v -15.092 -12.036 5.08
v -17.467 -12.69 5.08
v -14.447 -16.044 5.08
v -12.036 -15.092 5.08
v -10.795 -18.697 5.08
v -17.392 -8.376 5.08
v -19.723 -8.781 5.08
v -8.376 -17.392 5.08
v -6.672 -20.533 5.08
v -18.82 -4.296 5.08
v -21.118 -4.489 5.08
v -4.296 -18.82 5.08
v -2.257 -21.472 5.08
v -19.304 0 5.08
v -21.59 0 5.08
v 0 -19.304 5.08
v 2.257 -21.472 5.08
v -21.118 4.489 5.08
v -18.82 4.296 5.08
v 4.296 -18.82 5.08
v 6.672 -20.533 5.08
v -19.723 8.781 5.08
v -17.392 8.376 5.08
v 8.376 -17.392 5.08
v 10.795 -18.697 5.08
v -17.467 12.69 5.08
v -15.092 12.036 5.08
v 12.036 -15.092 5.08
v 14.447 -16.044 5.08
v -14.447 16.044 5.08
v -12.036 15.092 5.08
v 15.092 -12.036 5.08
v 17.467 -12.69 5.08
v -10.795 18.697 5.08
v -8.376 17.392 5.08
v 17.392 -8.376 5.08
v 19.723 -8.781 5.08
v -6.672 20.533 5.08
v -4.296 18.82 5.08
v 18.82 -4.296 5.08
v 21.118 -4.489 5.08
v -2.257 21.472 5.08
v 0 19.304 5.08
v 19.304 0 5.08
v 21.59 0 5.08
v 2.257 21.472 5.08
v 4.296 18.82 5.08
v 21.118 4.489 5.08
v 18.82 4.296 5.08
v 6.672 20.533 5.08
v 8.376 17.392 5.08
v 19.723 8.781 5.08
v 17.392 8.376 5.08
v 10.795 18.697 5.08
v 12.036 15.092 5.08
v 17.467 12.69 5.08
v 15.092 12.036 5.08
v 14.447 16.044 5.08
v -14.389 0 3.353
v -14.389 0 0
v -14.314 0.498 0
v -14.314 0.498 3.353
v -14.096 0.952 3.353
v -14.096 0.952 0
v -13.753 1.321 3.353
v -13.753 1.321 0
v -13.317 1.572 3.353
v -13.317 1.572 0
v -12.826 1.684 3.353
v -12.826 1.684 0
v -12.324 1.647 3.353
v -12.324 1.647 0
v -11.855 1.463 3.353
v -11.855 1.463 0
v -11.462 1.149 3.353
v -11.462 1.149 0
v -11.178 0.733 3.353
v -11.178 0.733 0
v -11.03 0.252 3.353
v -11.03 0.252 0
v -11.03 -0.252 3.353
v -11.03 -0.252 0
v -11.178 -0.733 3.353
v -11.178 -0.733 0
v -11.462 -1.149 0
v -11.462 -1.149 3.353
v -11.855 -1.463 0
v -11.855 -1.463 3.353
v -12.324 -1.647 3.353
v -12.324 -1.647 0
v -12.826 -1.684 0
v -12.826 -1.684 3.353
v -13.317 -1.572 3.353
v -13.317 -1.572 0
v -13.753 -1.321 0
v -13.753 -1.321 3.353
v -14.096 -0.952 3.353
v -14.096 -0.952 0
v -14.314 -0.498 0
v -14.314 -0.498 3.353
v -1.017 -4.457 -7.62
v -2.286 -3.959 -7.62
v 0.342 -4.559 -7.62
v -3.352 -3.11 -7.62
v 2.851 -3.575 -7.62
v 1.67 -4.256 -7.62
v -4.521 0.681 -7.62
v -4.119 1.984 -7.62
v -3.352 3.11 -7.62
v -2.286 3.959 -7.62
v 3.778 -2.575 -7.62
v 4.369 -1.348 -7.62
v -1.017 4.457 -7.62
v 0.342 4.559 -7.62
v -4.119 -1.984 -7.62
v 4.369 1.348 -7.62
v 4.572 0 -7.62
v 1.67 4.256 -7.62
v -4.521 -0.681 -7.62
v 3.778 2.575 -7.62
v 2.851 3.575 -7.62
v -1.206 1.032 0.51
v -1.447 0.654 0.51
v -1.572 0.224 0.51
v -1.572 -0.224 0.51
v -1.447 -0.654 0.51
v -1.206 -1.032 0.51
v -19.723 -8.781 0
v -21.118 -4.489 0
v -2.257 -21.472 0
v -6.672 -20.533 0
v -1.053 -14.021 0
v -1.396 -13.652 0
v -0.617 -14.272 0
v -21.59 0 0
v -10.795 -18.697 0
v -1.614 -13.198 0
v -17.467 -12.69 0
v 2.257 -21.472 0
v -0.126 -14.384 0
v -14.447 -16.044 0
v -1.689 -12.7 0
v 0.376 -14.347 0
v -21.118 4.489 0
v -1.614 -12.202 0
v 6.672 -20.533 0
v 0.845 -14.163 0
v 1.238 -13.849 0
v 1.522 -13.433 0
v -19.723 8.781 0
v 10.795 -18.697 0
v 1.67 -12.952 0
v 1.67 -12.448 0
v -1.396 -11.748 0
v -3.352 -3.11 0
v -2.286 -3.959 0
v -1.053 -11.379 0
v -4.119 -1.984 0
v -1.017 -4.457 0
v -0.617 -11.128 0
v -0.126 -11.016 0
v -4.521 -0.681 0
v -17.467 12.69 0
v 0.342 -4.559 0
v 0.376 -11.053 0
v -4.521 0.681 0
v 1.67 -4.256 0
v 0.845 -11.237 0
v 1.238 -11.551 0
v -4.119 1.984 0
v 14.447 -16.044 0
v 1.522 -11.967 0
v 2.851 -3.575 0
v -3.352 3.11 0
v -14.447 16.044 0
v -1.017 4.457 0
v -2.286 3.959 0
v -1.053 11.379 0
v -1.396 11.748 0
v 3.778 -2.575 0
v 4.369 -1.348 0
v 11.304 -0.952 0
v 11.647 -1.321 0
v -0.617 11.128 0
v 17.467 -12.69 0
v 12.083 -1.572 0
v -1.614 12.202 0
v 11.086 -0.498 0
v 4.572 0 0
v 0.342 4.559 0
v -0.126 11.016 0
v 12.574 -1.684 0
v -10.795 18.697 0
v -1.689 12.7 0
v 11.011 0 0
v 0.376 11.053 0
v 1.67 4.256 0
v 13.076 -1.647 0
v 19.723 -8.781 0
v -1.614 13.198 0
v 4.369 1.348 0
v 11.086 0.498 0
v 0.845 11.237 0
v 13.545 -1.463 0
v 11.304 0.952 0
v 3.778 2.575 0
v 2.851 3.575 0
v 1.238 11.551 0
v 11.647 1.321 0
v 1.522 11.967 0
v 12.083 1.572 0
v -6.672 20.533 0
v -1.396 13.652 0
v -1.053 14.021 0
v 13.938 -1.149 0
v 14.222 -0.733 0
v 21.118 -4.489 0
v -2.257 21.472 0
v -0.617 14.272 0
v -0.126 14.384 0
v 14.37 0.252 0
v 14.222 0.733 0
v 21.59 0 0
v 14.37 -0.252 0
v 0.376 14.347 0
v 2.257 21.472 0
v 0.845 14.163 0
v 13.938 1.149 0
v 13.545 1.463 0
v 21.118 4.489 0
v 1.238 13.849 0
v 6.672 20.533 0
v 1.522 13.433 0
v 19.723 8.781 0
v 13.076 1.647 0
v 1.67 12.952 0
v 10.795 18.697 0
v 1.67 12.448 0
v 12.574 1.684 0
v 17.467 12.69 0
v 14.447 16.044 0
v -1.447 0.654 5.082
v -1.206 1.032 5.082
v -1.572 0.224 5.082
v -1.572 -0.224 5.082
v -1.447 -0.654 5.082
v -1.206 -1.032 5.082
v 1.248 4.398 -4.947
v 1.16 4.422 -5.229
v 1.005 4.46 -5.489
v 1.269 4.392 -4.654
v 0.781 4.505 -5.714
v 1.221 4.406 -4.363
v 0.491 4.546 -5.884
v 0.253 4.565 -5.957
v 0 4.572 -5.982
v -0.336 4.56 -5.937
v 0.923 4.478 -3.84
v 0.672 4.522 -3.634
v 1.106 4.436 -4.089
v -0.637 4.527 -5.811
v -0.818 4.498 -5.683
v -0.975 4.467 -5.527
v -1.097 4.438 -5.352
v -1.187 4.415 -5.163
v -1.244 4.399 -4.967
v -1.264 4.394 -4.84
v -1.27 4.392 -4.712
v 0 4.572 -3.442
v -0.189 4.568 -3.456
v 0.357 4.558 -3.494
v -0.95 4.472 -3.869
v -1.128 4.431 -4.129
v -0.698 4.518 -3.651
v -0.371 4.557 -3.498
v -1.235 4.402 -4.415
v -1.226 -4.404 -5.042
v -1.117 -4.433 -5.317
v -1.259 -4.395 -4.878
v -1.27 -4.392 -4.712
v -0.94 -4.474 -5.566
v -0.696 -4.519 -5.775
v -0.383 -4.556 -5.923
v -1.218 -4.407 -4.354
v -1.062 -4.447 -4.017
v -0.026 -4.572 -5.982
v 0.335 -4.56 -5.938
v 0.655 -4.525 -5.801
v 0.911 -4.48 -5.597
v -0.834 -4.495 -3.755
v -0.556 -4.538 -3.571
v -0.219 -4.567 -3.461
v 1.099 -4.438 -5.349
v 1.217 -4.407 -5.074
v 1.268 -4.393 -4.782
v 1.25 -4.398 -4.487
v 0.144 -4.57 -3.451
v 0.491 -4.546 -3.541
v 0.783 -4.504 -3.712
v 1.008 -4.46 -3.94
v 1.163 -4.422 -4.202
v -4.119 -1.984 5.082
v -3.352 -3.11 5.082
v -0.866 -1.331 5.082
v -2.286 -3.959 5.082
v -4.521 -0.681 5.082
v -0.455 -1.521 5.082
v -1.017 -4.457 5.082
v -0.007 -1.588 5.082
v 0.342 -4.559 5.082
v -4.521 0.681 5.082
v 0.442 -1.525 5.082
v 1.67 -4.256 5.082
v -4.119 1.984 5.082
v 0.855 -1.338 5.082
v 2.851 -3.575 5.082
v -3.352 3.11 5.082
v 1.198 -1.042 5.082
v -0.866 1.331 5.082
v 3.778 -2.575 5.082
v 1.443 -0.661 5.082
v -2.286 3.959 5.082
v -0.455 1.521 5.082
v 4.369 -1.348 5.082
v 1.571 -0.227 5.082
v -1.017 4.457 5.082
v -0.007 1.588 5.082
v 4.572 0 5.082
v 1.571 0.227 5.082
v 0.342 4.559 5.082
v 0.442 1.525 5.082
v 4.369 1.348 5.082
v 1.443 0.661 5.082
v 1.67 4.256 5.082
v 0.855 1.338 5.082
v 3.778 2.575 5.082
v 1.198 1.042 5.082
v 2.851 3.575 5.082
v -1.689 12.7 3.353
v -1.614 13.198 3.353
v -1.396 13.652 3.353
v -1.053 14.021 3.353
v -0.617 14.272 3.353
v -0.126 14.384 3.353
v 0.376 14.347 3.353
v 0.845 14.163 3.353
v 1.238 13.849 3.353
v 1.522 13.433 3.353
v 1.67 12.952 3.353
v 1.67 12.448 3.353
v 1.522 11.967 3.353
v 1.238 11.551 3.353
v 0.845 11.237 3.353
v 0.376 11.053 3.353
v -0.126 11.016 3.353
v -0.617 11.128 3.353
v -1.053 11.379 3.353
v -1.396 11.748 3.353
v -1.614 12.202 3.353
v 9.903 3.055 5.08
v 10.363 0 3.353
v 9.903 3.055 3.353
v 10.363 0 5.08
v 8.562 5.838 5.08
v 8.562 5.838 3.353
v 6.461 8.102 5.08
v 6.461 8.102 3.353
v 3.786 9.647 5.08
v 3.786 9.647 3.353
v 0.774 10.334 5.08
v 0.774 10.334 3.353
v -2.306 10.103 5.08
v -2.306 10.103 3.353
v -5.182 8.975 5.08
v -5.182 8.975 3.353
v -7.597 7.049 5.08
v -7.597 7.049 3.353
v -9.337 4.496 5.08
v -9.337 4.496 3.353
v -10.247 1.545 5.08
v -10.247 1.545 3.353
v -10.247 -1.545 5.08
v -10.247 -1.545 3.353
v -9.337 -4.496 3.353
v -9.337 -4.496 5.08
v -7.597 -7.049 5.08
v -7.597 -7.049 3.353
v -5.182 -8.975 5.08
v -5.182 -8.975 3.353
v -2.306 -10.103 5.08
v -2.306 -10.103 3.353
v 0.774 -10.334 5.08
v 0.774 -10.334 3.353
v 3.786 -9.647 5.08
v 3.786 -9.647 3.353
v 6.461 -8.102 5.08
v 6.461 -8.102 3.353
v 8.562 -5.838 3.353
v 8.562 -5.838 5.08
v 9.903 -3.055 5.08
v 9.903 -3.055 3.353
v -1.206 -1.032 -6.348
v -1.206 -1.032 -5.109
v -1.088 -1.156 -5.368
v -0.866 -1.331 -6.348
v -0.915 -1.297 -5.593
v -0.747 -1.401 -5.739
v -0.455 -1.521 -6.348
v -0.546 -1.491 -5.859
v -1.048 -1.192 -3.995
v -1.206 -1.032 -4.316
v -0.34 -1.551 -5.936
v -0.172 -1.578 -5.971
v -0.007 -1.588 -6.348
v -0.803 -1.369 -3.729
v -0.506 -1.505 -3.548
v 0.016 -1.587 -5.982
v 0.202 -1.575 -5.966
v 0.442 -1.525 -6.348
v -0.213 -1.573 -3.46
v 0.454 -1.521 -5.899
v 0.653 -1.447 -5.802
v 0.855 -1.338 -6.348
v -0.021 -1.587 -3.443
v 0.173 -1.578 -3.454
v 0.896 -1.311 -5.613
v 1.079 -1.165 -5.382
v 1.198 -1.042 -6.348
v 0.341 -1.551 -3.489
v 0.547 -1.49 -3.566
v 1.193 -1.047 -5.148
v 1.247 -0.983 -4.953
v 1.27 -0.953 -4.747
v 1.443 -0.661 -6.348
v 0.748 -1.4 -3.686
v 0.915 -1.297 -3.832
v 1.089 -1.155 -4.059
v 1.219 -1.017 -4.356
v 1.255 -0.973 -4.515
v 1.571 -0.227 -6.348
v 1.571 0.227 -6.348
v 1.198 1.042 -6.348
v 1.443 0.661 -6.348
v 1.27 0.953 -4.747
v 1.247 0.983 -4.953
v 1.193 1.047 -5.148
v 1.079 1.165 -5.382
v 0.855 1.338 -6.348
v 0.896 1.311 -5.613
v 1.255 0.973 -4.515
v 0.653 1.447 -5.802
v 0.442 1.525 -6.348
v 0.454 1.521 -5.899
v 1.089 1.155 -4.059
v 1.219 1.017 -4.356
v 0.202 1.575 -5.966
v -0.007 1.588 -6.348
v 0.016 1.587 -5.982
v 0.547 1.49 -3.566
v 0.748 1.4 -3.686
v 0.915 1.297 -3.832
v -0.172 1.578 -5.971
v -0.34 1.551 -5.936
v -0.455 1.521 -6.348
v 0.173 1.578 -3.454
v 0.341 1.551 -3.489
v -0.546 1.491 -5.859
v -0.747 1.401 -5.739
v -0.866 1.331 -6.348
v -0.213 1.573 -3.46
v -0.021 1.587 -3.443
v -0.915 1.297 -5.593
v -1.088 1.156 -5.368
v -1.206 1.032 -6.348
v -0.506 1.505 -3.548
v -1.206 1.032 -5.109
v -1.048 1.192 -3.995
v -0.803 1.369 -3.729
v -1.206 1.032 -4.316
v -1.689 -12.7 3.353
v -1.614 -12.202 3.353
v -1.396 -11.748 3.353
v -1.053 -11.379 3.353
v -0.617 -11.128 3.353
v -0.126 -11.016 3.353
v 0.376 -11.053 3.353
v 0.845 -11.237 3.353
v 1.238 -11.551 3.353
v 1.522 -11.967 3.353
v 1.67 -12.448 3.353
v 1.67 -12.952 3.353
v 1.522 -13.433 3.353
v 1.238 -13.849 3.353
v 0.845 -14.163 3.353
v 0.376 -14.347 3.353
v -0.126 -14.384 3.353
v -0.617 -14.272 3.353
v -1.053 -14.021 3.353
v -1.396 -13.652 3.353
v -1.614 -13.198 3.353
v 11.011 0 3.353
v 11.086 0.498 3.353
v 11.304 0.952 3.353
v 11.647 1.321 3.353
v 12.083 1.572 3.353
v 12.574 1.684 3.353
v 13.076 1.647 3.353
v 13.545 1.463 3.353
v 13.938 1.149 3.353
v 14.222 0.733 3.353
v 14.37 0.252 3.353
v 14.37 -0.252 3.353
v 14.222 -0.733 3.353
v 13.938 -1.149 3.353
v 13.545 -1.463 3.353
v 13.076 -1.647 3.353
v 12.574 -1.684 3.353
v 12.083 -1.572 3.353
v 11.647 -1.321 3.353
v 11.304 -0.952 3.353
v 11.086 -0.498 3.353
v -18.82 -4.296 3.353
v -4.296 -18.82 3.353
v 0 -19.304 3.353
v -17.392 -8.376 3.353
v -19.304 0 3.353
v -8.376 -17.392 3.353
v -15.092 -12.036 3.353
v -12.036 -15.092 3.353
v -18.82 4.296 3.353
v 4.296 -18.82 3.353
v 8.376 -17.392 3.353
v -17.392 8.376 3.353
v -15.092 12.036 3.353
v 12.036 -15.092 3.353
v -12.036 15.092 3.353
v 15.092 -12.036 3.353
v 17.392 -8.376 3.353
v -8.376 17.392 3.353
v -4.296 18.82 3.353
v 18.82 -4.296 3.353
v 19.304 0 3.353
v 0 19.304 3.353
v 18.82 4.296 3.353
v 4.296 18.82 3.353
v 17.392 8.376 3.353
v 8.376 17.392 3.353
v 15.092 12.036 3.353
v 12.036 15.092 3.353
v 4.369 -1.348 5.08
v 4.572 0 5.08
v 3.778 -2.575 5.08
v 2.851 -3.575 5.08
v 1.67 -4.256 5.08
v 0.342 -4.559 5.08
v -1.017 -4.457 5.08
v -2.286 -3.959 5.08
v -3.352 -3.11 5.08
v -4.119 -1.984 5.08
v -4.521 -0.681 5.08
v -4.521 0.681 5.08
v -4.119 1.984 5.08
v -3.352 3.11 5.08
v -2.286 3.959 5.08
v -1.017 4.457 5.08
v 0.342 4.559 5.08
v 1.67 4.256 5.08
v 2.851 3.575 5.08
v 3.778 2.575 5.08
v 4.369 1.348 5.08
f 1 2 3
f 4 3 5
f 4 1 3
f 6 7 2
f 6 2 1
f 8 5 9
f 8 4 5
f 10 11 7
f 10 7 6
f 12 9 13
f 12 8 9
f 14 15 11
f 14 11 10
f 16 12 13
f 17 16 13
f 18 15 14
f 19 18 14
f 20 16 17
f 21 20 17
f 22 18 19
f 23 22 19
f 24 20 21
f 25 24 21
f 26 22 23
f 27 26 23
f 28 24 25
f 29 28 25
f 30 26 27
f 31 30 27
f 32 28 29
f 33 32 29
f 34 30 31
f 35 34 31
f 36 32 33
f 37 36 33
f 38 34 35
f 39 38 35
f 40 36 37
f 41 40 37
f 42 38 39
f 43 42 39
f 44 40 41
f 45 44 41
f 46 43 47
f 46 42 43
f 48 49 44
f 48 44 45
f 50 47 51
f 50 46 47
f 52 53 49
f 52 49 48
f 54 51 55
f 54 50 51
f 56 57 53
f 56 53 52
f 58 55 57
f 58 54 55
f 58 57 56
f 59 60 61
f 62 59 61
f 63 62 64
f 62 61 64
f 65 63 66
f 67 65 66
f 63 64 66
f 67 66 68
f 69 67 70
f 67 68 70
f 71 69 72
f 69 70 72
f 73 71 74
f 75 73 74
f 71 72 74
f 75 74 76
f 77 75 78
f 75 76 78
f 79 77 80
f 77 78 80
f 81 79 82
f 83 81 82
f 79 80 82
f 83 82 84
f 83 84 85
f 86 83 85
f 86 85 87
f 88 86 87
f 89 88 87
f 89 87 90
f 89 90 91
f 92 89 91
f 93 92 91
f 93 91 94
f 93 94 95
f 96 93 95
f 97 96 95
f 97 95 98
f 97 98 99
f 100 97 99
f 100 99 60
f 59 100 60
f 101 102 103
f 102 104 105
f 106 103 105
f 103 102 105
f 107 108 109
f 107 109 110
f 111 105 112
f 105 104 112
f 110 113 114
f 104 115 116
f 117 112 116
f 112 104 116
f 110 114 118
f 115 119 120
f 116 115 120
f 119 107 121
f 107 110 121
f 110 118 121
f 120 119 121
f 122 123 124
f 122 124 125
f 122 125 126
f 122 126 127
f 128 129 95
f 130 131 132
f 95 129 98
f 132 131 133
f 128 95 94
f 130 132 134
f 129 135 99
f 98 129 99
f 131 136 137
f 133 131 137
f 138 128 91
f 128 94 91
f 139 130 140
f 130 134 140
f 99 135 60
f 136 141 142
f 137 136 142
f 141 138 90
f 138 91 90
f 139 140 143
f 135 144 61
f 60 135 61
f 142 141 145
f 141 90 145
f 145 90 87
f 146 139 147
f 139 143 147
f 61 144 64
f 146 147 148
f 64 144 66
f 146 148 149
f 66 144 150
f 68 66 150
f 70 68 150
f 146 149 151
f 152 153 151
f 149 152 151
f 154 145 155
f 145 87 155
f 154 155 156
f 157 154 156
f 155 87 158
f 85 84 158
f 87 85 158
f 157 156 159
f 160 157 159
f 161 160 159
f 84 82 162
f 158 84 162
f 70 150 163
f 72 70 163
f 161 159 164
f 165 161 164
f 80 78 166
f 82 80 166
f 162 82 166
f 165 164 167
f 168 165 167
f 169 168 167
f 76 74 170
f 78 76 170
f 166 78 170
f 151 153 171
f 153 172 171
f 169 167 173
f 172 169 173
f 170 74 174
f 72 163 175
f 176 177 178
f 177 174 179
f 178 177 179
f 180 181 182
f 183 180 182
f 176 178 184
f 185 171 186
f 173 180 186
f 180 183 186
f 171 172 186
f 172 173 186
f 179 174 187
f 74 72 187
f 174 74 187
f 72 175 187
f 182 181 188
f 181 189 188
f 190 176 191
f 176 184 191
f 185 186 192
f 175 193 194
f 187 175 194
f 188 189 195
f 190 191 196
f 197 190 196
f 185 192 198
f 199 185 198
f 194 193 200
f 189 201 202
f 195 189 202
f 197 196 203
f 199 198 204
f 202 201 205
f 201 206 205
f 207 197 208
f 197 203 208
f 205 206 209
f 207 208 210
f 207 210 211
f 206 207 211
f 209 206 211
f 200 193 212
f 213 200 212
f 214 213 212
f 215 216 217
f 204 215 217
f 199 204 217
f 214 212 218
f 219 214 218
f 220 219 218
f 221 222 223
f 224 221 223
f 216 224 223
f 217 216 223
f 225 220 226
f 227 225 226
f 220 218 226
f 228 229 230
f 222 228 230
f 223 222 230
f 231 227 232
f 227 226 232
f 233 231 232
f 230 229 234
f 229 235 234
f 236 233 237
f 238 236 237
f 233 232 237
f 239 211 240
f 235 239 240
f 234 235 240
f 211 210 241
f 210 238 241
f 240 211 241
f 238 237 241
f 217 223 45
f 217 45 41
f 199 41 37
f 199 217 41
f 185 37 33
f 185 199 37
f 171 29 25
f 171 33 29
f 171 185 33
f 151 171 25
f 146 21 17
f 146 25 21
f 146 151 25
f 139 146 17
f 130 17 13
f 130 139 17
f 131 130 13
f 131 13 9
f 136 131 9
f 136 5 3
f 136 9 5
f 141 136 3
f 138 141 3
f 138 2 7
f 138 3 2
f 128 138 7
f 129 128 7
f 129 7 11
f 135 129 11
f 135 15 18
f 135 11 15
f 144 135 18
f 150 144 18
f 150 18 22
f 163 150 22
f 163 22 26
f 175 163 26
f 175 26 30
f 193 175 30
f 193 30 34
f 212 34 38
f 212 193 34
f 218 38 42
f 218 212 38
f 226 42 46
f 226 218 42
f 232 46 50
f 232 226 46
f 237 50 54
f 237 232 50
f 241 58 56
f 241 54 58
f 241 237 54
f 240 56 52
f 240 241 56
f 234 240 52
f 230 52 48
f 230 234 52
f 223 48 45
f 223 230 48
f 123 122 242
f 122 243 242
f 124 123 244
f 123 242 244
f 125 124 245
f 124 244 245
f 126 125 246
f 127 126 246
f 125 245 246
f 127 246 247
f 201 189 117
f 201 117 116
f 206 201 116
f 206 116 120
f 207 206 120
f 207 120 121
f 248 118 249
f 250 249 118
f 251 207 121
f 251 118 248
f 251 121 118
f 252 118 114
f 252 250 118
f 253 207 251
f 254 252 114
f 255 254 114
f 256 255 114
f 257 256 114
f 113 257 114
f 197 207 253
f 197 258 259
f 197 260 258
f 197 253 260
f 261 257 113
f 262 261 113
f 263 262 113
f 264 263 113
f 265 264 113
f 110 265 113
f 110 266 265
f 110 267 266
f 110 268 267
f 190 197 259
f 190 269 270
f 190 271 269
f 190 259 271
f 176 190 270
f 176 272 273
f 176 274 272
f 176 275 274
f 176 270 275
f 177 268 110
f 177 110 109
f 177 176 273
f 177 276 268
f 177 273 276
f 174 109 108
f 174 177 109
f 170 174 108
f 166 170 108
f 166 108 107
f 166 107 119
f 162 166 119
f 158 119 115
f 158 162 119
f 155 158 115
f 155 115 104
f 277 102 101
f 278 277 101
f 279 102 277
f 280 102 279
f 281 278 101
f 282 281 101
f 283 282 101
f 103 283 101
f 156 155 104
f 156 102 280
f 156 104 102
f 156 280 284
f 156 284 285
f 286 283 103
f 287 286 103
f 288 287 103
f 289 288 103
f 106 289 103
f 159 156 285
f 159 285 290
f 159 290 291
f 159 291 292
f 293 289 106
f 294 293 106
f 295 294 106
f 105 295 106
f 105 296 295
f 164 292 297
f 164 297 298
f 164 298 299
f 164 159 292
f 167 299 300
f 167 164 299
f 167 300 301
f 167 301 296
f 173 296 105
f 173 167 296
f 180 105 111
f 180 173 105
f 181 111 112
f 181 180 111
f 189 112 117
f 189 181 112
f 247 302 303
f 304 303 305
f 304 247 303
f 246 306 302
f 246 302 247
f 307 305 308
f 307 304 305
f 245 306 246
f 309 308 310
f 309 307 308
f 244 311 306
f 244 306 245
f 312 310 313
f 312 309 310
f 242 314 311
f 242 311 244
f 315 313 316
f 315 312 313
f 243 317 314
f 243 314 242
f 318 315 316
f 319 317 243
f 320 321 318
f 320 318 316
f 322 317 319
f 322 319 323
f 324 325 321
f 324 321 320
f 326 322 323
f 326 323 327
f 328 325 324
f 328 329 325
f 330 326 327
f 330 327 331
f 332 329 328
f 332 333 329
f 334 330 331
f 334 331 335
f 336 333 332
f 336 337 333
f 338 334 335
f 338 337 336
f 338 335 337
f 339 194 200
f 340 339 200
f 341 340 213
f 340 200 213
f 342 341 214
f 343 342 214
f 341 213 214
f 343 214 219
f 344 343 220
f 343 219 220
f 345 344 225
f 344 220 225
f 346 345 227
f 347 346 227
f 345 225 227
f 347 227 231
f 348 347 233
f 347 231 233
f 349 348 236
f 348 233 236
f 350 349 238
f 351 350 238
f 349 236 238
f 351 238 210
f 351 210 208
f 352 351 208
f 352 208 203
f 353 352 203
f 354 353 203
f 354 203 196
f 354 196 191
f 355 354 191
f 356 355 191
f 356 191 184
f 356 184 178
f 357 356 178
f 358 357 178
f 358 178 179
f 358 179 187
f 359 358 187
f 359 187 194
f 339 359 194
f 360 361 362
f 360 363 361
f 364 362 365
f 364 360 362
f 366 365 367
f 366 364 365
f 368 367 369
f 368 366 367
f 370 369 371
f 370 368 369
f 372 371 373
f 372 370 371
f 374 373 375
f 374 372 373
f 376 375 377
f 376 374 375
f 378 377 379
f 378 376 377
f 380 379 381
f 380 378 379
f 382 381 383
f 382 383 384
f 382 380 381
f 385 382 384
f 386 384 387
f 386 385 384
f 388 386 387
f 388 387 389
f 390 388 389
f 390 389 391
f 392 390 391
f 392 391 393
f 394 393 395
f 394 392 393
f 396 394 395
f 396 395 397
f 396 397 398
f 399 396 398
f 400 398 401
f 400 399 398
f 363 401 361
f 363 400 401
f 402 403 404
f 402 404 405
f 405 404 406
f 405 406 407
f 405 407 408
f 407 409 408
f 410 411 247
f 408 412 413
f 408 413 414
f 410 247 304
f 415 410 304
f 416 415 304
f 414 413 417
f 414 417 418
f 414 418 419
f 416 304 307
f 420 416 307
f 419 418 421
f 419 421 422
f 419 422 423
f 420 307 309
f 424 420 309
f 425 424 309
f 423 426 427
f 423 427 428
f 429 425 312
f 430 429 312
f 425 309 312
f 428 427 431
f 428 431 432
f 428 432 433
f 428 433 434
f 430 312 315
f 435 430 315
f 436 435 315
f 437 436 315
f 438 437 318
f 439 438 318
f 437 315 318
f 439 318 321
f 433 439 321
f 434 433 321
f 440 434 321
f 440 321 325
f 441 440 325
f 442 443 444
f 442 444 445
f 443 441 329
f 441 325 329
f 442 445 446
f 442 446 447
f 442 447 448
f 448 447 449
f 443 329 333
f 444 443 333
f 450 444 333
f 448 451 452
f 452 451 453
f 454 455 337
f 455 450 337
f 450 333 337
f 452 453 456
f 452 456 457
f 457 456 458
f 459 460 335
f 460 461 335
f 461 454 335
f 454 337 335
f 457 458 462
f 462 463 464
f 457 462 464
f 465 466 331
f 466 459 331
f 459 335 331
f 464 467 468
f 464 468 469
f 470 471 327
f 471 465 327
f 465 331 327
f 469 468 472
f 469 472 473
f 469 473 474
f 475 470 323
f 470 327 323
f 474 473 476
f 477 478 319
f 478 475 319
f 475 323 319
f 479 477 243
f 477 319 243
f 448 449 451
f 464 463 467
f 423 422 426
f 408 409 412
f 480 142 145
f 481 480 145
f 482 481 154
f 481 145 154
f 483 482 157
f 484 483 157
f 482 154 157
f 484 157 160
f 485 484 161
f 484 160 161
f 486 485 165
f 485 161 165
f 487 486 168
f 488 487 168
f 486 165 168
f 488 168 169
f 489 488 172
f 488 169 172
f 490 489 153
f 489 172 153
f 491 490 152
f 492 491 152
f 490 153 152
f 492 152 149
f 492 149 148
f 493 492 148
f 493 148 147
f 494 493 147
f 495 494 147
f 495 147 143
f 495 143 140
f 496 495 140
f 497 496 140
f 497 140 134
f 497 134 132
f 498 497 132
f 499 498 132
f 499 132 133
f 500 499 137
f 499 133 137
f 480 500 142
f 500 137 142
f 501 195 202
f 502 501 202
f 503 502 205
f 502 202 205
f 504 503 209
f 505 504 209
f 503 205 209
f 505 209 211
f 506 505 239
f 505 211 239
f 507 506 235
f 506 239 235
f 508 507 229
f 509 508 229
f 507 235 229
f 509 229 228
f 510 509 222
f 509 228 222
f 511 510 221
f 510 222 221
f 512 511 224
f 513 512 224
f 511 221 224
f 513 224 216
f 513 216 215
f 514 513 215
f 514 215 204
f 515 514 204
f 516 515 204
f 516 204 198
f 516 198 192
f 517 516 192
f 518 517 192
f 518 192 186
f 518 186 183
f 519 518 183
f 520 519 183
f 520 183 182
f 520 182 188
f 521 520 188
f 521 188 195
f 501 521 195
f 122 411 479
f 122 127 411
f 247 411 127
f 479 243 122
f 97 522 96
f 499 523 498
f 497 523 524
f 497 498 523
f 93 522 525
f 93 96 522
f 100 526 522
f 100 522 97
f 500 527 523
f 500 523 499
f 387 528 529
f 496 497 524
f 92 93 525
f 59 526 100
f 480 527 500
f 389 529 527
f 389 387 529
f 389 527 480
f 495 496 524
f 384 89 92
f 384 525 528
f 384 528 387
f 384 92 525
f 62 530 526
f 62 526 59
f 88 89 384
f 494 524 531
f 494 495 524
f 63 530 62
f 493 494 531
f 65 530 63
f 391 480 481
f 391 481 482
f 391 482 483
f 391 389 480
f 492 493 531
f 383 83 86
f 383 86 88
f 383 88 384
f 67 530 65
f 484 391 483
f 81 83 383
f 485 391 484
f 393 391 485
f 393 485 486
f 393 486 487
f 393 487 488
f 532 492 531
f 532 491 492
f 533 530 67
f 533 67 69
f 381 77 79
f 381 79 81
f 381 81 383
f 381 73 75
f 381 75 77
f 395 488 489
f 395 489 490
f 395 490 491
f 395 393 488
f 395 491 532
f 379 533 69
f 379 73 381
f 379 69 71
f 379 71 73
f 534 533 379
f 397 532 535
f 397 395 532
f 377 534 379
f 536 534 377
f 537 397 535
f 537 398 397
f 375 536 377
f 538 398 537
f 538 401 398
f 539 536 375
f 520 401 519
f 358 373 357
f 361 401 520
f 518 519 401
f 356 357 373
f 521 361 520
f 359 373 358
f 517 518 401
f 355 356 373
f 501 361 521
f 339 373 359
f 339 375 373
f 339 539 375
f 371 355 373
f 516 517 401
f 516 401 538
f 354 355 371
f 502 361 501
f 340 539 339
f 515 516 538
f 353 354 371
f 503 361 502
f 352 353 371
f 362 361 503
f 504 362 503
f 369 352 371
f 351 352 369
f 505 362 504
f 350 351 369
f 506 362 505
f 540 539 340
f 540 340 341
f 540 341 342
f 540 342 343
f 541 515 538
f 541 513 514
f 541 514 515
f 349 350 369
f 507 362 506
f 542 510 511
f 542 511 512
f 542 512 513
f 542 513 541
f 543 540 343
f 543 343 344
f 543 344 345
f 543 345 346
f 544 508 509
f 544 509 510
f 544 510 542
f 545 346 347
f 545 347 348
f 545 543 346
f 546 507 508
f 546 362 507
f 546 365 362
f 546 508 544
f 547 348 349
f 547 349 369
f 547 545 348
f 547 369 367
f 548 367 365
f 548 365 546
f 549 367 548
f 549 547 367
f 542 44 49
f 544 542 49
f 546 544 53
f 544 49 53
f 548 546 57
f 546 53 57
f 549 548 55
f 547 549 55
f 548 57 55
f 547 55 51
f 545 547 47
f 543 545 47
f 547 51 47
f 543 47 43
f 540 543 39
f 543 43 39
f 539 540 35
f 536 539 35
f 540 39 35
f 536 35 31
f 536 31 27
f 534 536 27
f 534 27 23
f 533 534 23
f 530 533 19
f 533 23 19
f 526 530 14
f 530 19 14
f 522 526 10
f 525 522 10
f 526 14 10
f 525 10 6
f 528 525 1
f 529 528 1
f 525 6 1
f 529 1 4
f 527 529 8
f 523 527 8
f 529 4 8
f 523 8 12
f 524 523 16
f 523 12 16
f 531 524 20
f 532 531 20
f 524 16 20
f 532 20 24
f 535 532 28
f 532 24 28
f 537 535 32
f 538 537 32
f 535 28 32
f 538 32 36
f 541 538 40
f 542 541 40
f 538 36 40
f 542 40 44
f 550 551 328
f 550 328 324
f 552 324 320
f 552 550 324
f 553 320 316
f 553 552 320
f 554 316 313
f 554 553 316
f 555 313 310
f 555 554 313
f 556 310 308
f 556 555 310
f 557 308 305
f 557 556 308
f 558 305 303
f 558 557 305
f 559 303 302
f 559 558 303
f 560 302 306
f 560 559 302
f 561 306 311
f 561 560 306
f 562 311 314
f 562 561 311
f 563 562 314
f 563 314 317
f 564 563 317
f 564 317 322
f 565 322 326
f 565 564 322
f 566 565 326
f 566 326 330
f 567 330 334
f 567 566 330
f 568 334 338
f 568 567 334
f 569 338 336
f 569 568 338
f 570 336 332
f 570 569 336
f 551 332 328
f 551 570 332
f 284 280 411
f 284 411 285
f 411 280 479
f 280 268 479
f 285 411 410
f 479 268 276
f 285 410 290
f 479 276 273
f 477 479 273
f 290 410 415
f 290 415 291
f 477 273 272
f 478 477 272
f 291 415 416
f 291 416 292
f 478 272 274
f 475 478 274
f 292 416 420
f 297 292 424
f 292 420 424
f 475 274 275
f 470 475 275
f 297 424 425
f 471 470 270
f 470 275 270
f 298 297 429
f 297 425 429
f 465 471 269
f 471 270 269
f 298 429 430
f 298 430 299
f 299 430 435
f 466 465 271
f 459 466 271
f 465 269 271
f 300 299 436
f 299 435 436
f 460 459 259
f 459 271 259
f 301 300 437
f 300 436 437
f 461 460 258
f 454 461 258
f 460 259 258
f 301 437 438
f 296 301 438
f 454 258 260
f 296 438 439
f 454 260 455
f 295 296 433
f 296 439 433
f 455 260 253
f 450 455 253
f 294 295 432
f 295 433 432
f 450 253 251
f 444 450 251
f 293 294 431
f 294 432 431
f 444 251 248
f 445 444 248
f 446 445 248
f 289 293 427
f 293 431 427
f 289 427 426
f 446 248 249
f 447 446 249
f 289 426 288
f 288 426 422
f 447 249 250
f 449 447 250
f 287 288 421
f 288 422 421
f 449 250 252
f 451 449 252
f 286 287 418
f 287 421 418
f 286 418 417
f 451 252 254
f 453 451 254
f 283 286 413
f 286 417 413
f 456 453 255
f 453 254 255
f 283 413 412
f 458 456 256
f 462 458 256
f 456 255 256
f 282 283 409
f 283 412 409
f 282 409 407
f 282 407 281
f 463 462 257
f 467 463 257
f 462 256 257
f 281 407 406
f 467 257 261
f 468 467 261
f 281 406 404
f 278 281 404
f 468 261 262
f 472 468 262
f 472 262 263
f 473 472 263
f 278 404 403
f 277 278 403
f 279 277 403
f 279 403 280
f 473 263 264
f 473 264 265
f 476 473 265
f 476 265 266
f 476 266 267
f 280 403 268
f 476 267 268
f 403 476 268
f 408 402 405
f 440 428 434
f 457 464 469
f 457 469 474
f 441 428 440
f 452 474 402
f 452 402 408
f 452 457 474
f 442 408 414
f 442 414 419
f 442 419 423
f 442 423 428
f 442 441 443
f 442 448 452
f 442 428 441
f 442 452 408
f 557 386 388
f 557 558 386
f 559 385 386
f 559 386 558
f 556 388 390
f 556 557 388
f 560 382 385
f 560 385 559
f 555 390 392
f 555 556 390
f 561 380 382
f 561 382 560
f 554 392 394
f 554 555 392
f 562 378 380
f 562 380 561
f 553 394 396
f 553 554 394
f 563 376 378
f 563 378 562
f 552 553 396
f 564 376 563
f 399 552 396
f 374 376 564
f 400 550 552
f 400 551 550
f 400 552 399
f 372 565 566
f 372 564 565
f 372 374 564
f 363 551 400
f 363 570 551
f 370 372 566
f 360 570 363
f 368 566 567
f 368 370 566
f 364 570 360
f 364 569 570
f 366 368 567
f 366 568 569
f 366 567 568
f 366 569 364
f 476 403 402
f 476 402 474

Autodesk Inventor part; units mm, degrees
ref_plane "YZ Plane" through (0, 0, 0) normal (1, 0, 0) x (0, 1, 0)
ref_plane "XY Plane" through (0, 0, 0) normal (0, 0, 1) x (1, 0, 0)
sketch "Sketch1" plane through (0, 0, 0) normal (0, 0, 1) x (1, 0, 0)
  circle A0 centre (0, 0) radius 21.59
  dimension "d0" = 43.18
extrude "Extrusion1" add sketch "Sketch1" along normal blind 5.08
sketch "Sketch2" plane through (0, 0, 5.08) normal (0, 0, 1) x (1, 0, 0)
  circle A0 centre (0, 0) radius 10.3632
  circle A1 centre (0, 0) radius 19.304
  dimension "d3" = 20.7264
  dimension "d4" = 38.608
extrude "Extrusion2" cut sketch "Sketch2" against normal blind 1.7272
sketch "Sketch3" plane through (0, 0, 5.08) normal (0, 0, 1) x (1, 0, 0)
  circle A0 centre (0, 0) radius 4.572
  dimension "d7" = 9.144
extrude "Extrusion3" add sketch "Sketch3" along normal blind 0.0025 and the other way blind 12.7
sketch "Sketch5" plane through (0, 0, 5.0825) normal (0, 0, 1) x (1, 0, 0)
  arc A0 (-1.2065, -1.0318) -> (-1.2065, 1.0318) centre (0, 0) ccw
  line L0 (-1.2065, -1.0318) -> (-1.2065, 1.0318)
extrude "Extrusion5" cut sketch "Sketch5" against normal blind 11.43
sketch "Sketch6" plane through (0, 0, 5.0825) normal (0, 0, 1) x (1, 0, 0)
  circle A0 centre (0, 0) radius 1.5875
  dimension "d19" = 3.175
extrude "Extrusion6" cut sketch "Sketch6" against normal blind 4.572
sketch "Sketch8" plane through (0, 0, 0) normal (0, 0, -1) x (-1, 0, 0)
  circle A0 centre (0, 0) radius 10.3632 projected
  circle A1 centre (12.7, 0) radius 1.6891
  circle A2 centre (-12.7, 0) radius 1.6891
  circle A3 centre (0, 0) radius 4.572 projected
  circle A4 centre (0, 0) radius 6.6294 projected
  circle A5 centre (0, -12.7) radius 1.6891
  circle A6 centre (0, 12.7) radius 1.6891
  dimension "d25" = 3.3782
  dimension "d26" = 3.3782
  dimension "d29" = 3.3782
  dimension "d30" = 3.3782
  dimension "d38" = 12.7
  dimension "d39" = 12.7
  dimension "d40" = 12.7
  dimension "d41" = 12.7
extrude "Extrusion8" cut sketch "Sketch8" against normal blind 25.4 contours A1 | A2 | A5 | A6
ref_plane "Work Plane1" through (0, 4.572, 5.08) normal (0, 1, 0) x (-1, 0, 0)
sketch "Sketch9" plane through (0, 4.572, 5.08) normal (0, 1, 0) x (-1, 0, 0)
  circle A0 centre (0, -9.7924) radius 1.27
  point P0 (0, -5.08)
  dimension "d35" = 2.54
extrude "Extrusion9" cut sketch "Sketch9" against normal blind 25.4
properties part number "Shaft"
